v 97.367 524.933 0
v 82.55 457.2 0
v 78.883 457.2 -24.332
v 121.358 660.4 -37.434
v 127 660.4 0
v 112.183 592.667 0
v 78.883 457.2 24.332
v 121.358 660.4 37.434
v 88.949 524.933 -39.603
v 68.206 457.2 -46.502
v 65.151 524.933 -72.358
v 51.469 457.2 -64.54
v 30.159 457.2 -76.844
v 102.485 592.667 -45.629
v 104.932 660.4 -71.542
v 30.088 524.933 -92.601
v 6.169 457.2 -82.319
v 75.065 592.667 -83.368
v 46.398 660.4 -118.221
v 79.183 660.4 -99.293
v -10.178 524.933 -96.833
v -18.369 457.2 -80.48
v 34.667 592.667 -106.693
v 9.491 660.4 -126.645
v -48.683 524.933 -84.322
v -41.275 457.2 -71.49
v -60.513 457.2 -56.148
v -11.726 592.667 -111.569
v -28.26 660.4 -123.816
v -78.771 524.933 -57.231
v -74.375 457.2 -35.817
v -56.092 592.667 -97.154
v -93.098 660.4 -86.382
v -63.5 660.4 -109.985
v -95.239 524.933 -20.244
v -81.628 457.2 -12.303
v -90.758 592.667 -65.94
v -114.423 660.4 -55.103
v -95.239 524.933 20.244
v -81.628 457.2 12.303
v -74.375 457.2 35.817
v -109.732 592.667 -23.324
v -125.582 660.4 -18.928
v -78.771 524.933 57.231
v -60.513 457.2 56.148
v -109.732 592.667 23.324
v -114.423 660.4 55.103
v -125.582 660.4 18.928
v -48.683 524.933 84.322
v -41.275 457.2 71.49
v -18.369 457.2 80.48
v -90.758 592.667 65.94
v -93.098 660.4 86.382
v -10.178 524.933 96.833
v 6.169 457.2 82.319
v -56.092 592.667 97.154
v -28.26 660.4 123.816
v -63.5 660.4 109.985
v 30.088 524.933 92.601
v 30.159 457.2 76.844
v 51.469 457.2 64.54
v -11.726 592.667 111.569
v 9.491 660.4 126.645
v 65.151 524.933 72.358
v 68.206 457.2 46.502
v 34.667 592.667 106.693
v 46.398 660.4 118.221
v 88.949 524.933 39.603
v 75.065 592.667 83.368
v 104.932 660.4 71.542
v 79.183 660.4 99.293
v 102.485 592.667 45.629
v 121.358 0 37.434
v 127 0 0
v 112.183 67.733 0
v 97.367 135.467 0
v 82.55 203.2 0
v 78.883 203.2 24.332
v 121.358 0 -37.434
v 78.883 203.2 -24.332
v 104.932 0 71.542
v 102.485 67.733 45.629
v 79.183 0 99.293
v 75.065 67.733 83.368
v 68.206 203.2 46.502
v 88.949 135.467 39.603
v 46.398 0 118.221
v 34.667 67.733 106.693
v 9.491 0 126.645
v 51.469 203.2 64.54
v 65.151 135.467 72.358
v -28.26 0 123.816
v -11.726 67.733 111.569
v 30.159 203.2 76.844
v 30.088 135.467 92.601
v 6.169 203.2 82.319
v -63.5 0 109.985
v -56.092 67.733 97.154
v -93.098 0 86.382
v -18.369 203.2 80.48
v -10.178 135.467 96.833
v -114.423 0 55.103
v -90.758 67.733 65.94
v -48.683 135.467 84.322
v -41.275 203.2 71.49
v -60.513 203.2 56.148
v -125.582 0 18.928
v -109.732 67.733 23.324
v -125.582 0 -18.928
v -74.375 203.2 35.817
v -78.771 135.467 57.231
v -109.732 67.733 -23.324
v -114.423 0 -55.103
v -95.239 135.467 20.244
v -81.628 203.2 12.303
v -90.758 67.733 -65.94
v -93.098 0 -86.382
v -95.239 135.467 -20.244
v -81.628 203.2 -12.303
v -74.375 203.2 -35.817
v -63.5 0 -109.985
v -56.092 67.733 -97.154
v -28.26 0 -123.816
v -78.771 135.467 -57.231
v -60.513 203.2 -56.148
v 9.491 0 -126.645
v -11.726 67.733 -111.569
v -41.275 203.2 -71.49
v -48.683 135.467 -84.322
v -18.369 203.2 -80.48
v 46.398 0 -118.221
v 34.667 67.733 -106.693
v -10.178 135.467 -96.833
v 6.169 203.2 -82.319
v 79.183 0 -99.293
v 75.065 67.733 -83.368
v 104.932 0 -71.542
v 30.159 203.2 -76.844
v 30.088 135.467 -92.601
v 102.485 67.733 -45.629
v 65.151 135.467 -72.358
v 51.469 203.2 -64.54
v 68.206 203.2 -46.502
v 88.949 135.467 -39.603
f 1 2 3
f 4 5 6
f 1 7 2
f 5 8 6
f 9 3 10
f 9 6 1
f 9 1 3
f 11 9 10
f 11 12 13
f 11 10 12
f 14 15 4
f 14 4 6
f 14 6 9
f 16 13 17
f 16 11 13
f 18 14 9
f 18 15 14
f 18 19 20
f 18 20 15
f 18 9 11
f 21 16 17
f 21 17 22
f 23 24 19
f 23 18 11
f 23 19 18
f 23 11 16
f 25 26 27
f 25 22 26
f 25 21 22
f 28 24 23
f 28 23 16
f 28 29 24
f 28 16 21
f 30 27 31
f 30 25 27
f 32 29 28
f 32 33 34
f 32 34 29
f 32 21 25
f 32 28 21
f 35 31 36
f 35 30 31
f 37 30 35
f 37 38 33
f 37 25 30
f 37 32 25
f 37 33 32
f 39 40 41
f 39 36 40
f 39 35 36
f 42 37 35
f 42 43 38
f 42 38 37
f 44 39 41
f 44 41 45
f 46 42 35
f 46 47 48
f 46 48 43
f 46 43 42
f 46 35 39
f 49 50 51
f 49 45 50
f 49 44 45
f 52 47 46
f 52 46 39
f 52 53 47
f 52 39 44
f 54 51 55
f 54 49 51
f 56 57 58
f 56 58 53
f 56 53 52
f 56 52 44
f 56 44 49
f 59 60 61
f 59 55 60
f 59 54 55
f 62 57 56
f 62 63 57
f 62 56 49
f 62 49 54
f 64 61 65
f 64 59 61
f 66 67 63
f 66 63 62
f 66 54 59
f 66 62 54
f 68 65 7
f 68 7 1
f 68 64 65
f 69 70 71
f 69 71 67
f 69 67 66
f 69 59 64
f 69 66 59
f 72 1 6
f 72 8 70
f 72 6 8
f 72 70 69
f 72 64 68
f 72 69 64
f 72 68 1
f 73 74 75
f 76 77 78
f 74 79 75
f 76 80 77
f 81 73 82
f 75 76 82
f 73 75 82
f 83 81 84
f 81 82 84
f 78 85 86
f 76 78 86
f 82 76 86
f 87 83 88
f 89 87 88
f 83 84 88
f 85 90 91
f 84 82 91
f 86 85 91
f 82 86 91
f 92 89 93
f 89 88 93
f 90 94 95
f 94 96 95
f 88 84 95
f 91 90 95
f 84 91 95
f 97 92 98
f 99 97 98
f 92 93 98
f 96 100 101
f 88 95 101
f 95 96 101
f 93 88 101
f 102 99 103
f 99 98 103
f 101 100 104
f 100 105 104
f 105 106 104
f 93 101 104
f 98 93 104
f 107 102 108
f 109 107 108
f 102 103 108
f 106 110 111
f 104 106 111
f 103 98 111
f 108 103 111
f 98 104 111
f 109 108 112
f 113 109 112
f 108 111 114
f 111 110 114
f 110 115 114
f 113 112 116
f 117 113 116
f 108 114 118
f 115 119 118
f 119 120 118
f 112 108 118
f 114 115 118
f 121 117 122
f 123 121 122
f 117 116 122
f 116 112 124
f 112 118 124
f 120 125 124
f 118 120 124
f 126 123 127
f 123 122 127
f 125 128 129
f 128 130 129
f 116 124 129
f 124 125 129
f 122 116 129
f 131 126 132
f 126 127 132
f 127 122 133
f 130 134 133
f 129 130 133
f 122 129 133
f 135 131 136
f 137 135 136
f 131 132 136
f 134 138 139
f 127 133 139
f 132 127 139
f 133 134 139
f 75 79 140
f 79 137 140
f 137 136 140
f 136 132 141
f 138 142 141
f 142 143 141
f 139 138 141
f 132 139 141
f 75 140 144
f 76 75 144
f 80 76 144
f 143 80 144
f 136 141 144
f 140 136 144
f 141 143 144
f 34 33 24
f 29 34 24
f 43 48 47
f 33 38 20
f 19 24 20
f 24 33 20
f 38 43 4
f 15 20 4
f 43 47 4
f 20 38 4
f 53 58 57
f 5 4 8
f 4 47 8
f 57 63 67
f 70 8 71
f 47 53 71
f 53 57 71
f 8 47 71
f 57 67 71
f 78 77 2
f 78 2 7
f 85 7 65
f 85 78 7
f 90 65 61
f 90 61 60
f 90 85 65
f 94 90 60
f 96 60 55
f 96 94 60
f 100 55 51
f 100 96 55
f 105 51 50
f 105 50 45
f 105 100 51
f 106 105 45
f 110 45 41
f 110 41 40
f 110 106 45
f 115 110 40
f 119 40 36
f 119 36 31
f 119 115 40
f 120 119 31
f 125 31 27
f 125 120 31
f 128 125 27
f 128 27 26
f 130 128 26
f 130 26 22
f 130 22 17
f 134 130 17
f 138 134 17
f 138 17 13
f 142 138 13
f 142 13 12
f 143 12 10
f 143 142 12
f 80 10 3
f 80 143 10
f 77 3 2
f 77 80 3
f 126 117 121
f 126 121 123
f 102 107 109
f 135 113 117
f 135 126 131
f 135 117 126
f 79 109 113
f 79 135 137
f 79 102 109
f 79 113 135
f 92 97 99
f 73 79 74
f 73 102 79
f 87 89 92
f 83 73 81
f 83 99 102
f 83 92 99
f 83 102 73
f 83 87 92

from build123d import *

# Parameters (mm, degrees)
F0_R      = 127
F2_R      = 82.55
F4_R      = 82.55
F5_DEPTH  = 254
F5_FACE_R = 82.55
F7_R      = 127


with BuildPart() as f3:
    # F0 (on Front) → F3 section 0
    with BuildSketch(Plane.XZ):
        Circle(F0_R)
    # F2 (on offset) → F3 section 1
    with BuildSketch(Plane.XZ.offset(-203.2)):
        Circle(F2_R)
    loft()

    # F4 (on offset) → F5 (join)
    with BuildSketch(Plane.XZ.offset(-203.2)):
        Circle(F4_R)
    extrude(amount=-F5_DEPTH)

    # F5_face (on face) → F8 section 0
    with BuildSketch(Plane(origin=(0, 457.2, 0), x_dir=(1, 0, 0), z_dir=(0, 1, 0))):
        Circle(F5_FACE_R)
    # F7 (on offset) → F8 section 1
    with BuildSketch(Plane.XZ.offset(-660.4)):
        Circle(F7_R)
    loft()


solid = f3.part
